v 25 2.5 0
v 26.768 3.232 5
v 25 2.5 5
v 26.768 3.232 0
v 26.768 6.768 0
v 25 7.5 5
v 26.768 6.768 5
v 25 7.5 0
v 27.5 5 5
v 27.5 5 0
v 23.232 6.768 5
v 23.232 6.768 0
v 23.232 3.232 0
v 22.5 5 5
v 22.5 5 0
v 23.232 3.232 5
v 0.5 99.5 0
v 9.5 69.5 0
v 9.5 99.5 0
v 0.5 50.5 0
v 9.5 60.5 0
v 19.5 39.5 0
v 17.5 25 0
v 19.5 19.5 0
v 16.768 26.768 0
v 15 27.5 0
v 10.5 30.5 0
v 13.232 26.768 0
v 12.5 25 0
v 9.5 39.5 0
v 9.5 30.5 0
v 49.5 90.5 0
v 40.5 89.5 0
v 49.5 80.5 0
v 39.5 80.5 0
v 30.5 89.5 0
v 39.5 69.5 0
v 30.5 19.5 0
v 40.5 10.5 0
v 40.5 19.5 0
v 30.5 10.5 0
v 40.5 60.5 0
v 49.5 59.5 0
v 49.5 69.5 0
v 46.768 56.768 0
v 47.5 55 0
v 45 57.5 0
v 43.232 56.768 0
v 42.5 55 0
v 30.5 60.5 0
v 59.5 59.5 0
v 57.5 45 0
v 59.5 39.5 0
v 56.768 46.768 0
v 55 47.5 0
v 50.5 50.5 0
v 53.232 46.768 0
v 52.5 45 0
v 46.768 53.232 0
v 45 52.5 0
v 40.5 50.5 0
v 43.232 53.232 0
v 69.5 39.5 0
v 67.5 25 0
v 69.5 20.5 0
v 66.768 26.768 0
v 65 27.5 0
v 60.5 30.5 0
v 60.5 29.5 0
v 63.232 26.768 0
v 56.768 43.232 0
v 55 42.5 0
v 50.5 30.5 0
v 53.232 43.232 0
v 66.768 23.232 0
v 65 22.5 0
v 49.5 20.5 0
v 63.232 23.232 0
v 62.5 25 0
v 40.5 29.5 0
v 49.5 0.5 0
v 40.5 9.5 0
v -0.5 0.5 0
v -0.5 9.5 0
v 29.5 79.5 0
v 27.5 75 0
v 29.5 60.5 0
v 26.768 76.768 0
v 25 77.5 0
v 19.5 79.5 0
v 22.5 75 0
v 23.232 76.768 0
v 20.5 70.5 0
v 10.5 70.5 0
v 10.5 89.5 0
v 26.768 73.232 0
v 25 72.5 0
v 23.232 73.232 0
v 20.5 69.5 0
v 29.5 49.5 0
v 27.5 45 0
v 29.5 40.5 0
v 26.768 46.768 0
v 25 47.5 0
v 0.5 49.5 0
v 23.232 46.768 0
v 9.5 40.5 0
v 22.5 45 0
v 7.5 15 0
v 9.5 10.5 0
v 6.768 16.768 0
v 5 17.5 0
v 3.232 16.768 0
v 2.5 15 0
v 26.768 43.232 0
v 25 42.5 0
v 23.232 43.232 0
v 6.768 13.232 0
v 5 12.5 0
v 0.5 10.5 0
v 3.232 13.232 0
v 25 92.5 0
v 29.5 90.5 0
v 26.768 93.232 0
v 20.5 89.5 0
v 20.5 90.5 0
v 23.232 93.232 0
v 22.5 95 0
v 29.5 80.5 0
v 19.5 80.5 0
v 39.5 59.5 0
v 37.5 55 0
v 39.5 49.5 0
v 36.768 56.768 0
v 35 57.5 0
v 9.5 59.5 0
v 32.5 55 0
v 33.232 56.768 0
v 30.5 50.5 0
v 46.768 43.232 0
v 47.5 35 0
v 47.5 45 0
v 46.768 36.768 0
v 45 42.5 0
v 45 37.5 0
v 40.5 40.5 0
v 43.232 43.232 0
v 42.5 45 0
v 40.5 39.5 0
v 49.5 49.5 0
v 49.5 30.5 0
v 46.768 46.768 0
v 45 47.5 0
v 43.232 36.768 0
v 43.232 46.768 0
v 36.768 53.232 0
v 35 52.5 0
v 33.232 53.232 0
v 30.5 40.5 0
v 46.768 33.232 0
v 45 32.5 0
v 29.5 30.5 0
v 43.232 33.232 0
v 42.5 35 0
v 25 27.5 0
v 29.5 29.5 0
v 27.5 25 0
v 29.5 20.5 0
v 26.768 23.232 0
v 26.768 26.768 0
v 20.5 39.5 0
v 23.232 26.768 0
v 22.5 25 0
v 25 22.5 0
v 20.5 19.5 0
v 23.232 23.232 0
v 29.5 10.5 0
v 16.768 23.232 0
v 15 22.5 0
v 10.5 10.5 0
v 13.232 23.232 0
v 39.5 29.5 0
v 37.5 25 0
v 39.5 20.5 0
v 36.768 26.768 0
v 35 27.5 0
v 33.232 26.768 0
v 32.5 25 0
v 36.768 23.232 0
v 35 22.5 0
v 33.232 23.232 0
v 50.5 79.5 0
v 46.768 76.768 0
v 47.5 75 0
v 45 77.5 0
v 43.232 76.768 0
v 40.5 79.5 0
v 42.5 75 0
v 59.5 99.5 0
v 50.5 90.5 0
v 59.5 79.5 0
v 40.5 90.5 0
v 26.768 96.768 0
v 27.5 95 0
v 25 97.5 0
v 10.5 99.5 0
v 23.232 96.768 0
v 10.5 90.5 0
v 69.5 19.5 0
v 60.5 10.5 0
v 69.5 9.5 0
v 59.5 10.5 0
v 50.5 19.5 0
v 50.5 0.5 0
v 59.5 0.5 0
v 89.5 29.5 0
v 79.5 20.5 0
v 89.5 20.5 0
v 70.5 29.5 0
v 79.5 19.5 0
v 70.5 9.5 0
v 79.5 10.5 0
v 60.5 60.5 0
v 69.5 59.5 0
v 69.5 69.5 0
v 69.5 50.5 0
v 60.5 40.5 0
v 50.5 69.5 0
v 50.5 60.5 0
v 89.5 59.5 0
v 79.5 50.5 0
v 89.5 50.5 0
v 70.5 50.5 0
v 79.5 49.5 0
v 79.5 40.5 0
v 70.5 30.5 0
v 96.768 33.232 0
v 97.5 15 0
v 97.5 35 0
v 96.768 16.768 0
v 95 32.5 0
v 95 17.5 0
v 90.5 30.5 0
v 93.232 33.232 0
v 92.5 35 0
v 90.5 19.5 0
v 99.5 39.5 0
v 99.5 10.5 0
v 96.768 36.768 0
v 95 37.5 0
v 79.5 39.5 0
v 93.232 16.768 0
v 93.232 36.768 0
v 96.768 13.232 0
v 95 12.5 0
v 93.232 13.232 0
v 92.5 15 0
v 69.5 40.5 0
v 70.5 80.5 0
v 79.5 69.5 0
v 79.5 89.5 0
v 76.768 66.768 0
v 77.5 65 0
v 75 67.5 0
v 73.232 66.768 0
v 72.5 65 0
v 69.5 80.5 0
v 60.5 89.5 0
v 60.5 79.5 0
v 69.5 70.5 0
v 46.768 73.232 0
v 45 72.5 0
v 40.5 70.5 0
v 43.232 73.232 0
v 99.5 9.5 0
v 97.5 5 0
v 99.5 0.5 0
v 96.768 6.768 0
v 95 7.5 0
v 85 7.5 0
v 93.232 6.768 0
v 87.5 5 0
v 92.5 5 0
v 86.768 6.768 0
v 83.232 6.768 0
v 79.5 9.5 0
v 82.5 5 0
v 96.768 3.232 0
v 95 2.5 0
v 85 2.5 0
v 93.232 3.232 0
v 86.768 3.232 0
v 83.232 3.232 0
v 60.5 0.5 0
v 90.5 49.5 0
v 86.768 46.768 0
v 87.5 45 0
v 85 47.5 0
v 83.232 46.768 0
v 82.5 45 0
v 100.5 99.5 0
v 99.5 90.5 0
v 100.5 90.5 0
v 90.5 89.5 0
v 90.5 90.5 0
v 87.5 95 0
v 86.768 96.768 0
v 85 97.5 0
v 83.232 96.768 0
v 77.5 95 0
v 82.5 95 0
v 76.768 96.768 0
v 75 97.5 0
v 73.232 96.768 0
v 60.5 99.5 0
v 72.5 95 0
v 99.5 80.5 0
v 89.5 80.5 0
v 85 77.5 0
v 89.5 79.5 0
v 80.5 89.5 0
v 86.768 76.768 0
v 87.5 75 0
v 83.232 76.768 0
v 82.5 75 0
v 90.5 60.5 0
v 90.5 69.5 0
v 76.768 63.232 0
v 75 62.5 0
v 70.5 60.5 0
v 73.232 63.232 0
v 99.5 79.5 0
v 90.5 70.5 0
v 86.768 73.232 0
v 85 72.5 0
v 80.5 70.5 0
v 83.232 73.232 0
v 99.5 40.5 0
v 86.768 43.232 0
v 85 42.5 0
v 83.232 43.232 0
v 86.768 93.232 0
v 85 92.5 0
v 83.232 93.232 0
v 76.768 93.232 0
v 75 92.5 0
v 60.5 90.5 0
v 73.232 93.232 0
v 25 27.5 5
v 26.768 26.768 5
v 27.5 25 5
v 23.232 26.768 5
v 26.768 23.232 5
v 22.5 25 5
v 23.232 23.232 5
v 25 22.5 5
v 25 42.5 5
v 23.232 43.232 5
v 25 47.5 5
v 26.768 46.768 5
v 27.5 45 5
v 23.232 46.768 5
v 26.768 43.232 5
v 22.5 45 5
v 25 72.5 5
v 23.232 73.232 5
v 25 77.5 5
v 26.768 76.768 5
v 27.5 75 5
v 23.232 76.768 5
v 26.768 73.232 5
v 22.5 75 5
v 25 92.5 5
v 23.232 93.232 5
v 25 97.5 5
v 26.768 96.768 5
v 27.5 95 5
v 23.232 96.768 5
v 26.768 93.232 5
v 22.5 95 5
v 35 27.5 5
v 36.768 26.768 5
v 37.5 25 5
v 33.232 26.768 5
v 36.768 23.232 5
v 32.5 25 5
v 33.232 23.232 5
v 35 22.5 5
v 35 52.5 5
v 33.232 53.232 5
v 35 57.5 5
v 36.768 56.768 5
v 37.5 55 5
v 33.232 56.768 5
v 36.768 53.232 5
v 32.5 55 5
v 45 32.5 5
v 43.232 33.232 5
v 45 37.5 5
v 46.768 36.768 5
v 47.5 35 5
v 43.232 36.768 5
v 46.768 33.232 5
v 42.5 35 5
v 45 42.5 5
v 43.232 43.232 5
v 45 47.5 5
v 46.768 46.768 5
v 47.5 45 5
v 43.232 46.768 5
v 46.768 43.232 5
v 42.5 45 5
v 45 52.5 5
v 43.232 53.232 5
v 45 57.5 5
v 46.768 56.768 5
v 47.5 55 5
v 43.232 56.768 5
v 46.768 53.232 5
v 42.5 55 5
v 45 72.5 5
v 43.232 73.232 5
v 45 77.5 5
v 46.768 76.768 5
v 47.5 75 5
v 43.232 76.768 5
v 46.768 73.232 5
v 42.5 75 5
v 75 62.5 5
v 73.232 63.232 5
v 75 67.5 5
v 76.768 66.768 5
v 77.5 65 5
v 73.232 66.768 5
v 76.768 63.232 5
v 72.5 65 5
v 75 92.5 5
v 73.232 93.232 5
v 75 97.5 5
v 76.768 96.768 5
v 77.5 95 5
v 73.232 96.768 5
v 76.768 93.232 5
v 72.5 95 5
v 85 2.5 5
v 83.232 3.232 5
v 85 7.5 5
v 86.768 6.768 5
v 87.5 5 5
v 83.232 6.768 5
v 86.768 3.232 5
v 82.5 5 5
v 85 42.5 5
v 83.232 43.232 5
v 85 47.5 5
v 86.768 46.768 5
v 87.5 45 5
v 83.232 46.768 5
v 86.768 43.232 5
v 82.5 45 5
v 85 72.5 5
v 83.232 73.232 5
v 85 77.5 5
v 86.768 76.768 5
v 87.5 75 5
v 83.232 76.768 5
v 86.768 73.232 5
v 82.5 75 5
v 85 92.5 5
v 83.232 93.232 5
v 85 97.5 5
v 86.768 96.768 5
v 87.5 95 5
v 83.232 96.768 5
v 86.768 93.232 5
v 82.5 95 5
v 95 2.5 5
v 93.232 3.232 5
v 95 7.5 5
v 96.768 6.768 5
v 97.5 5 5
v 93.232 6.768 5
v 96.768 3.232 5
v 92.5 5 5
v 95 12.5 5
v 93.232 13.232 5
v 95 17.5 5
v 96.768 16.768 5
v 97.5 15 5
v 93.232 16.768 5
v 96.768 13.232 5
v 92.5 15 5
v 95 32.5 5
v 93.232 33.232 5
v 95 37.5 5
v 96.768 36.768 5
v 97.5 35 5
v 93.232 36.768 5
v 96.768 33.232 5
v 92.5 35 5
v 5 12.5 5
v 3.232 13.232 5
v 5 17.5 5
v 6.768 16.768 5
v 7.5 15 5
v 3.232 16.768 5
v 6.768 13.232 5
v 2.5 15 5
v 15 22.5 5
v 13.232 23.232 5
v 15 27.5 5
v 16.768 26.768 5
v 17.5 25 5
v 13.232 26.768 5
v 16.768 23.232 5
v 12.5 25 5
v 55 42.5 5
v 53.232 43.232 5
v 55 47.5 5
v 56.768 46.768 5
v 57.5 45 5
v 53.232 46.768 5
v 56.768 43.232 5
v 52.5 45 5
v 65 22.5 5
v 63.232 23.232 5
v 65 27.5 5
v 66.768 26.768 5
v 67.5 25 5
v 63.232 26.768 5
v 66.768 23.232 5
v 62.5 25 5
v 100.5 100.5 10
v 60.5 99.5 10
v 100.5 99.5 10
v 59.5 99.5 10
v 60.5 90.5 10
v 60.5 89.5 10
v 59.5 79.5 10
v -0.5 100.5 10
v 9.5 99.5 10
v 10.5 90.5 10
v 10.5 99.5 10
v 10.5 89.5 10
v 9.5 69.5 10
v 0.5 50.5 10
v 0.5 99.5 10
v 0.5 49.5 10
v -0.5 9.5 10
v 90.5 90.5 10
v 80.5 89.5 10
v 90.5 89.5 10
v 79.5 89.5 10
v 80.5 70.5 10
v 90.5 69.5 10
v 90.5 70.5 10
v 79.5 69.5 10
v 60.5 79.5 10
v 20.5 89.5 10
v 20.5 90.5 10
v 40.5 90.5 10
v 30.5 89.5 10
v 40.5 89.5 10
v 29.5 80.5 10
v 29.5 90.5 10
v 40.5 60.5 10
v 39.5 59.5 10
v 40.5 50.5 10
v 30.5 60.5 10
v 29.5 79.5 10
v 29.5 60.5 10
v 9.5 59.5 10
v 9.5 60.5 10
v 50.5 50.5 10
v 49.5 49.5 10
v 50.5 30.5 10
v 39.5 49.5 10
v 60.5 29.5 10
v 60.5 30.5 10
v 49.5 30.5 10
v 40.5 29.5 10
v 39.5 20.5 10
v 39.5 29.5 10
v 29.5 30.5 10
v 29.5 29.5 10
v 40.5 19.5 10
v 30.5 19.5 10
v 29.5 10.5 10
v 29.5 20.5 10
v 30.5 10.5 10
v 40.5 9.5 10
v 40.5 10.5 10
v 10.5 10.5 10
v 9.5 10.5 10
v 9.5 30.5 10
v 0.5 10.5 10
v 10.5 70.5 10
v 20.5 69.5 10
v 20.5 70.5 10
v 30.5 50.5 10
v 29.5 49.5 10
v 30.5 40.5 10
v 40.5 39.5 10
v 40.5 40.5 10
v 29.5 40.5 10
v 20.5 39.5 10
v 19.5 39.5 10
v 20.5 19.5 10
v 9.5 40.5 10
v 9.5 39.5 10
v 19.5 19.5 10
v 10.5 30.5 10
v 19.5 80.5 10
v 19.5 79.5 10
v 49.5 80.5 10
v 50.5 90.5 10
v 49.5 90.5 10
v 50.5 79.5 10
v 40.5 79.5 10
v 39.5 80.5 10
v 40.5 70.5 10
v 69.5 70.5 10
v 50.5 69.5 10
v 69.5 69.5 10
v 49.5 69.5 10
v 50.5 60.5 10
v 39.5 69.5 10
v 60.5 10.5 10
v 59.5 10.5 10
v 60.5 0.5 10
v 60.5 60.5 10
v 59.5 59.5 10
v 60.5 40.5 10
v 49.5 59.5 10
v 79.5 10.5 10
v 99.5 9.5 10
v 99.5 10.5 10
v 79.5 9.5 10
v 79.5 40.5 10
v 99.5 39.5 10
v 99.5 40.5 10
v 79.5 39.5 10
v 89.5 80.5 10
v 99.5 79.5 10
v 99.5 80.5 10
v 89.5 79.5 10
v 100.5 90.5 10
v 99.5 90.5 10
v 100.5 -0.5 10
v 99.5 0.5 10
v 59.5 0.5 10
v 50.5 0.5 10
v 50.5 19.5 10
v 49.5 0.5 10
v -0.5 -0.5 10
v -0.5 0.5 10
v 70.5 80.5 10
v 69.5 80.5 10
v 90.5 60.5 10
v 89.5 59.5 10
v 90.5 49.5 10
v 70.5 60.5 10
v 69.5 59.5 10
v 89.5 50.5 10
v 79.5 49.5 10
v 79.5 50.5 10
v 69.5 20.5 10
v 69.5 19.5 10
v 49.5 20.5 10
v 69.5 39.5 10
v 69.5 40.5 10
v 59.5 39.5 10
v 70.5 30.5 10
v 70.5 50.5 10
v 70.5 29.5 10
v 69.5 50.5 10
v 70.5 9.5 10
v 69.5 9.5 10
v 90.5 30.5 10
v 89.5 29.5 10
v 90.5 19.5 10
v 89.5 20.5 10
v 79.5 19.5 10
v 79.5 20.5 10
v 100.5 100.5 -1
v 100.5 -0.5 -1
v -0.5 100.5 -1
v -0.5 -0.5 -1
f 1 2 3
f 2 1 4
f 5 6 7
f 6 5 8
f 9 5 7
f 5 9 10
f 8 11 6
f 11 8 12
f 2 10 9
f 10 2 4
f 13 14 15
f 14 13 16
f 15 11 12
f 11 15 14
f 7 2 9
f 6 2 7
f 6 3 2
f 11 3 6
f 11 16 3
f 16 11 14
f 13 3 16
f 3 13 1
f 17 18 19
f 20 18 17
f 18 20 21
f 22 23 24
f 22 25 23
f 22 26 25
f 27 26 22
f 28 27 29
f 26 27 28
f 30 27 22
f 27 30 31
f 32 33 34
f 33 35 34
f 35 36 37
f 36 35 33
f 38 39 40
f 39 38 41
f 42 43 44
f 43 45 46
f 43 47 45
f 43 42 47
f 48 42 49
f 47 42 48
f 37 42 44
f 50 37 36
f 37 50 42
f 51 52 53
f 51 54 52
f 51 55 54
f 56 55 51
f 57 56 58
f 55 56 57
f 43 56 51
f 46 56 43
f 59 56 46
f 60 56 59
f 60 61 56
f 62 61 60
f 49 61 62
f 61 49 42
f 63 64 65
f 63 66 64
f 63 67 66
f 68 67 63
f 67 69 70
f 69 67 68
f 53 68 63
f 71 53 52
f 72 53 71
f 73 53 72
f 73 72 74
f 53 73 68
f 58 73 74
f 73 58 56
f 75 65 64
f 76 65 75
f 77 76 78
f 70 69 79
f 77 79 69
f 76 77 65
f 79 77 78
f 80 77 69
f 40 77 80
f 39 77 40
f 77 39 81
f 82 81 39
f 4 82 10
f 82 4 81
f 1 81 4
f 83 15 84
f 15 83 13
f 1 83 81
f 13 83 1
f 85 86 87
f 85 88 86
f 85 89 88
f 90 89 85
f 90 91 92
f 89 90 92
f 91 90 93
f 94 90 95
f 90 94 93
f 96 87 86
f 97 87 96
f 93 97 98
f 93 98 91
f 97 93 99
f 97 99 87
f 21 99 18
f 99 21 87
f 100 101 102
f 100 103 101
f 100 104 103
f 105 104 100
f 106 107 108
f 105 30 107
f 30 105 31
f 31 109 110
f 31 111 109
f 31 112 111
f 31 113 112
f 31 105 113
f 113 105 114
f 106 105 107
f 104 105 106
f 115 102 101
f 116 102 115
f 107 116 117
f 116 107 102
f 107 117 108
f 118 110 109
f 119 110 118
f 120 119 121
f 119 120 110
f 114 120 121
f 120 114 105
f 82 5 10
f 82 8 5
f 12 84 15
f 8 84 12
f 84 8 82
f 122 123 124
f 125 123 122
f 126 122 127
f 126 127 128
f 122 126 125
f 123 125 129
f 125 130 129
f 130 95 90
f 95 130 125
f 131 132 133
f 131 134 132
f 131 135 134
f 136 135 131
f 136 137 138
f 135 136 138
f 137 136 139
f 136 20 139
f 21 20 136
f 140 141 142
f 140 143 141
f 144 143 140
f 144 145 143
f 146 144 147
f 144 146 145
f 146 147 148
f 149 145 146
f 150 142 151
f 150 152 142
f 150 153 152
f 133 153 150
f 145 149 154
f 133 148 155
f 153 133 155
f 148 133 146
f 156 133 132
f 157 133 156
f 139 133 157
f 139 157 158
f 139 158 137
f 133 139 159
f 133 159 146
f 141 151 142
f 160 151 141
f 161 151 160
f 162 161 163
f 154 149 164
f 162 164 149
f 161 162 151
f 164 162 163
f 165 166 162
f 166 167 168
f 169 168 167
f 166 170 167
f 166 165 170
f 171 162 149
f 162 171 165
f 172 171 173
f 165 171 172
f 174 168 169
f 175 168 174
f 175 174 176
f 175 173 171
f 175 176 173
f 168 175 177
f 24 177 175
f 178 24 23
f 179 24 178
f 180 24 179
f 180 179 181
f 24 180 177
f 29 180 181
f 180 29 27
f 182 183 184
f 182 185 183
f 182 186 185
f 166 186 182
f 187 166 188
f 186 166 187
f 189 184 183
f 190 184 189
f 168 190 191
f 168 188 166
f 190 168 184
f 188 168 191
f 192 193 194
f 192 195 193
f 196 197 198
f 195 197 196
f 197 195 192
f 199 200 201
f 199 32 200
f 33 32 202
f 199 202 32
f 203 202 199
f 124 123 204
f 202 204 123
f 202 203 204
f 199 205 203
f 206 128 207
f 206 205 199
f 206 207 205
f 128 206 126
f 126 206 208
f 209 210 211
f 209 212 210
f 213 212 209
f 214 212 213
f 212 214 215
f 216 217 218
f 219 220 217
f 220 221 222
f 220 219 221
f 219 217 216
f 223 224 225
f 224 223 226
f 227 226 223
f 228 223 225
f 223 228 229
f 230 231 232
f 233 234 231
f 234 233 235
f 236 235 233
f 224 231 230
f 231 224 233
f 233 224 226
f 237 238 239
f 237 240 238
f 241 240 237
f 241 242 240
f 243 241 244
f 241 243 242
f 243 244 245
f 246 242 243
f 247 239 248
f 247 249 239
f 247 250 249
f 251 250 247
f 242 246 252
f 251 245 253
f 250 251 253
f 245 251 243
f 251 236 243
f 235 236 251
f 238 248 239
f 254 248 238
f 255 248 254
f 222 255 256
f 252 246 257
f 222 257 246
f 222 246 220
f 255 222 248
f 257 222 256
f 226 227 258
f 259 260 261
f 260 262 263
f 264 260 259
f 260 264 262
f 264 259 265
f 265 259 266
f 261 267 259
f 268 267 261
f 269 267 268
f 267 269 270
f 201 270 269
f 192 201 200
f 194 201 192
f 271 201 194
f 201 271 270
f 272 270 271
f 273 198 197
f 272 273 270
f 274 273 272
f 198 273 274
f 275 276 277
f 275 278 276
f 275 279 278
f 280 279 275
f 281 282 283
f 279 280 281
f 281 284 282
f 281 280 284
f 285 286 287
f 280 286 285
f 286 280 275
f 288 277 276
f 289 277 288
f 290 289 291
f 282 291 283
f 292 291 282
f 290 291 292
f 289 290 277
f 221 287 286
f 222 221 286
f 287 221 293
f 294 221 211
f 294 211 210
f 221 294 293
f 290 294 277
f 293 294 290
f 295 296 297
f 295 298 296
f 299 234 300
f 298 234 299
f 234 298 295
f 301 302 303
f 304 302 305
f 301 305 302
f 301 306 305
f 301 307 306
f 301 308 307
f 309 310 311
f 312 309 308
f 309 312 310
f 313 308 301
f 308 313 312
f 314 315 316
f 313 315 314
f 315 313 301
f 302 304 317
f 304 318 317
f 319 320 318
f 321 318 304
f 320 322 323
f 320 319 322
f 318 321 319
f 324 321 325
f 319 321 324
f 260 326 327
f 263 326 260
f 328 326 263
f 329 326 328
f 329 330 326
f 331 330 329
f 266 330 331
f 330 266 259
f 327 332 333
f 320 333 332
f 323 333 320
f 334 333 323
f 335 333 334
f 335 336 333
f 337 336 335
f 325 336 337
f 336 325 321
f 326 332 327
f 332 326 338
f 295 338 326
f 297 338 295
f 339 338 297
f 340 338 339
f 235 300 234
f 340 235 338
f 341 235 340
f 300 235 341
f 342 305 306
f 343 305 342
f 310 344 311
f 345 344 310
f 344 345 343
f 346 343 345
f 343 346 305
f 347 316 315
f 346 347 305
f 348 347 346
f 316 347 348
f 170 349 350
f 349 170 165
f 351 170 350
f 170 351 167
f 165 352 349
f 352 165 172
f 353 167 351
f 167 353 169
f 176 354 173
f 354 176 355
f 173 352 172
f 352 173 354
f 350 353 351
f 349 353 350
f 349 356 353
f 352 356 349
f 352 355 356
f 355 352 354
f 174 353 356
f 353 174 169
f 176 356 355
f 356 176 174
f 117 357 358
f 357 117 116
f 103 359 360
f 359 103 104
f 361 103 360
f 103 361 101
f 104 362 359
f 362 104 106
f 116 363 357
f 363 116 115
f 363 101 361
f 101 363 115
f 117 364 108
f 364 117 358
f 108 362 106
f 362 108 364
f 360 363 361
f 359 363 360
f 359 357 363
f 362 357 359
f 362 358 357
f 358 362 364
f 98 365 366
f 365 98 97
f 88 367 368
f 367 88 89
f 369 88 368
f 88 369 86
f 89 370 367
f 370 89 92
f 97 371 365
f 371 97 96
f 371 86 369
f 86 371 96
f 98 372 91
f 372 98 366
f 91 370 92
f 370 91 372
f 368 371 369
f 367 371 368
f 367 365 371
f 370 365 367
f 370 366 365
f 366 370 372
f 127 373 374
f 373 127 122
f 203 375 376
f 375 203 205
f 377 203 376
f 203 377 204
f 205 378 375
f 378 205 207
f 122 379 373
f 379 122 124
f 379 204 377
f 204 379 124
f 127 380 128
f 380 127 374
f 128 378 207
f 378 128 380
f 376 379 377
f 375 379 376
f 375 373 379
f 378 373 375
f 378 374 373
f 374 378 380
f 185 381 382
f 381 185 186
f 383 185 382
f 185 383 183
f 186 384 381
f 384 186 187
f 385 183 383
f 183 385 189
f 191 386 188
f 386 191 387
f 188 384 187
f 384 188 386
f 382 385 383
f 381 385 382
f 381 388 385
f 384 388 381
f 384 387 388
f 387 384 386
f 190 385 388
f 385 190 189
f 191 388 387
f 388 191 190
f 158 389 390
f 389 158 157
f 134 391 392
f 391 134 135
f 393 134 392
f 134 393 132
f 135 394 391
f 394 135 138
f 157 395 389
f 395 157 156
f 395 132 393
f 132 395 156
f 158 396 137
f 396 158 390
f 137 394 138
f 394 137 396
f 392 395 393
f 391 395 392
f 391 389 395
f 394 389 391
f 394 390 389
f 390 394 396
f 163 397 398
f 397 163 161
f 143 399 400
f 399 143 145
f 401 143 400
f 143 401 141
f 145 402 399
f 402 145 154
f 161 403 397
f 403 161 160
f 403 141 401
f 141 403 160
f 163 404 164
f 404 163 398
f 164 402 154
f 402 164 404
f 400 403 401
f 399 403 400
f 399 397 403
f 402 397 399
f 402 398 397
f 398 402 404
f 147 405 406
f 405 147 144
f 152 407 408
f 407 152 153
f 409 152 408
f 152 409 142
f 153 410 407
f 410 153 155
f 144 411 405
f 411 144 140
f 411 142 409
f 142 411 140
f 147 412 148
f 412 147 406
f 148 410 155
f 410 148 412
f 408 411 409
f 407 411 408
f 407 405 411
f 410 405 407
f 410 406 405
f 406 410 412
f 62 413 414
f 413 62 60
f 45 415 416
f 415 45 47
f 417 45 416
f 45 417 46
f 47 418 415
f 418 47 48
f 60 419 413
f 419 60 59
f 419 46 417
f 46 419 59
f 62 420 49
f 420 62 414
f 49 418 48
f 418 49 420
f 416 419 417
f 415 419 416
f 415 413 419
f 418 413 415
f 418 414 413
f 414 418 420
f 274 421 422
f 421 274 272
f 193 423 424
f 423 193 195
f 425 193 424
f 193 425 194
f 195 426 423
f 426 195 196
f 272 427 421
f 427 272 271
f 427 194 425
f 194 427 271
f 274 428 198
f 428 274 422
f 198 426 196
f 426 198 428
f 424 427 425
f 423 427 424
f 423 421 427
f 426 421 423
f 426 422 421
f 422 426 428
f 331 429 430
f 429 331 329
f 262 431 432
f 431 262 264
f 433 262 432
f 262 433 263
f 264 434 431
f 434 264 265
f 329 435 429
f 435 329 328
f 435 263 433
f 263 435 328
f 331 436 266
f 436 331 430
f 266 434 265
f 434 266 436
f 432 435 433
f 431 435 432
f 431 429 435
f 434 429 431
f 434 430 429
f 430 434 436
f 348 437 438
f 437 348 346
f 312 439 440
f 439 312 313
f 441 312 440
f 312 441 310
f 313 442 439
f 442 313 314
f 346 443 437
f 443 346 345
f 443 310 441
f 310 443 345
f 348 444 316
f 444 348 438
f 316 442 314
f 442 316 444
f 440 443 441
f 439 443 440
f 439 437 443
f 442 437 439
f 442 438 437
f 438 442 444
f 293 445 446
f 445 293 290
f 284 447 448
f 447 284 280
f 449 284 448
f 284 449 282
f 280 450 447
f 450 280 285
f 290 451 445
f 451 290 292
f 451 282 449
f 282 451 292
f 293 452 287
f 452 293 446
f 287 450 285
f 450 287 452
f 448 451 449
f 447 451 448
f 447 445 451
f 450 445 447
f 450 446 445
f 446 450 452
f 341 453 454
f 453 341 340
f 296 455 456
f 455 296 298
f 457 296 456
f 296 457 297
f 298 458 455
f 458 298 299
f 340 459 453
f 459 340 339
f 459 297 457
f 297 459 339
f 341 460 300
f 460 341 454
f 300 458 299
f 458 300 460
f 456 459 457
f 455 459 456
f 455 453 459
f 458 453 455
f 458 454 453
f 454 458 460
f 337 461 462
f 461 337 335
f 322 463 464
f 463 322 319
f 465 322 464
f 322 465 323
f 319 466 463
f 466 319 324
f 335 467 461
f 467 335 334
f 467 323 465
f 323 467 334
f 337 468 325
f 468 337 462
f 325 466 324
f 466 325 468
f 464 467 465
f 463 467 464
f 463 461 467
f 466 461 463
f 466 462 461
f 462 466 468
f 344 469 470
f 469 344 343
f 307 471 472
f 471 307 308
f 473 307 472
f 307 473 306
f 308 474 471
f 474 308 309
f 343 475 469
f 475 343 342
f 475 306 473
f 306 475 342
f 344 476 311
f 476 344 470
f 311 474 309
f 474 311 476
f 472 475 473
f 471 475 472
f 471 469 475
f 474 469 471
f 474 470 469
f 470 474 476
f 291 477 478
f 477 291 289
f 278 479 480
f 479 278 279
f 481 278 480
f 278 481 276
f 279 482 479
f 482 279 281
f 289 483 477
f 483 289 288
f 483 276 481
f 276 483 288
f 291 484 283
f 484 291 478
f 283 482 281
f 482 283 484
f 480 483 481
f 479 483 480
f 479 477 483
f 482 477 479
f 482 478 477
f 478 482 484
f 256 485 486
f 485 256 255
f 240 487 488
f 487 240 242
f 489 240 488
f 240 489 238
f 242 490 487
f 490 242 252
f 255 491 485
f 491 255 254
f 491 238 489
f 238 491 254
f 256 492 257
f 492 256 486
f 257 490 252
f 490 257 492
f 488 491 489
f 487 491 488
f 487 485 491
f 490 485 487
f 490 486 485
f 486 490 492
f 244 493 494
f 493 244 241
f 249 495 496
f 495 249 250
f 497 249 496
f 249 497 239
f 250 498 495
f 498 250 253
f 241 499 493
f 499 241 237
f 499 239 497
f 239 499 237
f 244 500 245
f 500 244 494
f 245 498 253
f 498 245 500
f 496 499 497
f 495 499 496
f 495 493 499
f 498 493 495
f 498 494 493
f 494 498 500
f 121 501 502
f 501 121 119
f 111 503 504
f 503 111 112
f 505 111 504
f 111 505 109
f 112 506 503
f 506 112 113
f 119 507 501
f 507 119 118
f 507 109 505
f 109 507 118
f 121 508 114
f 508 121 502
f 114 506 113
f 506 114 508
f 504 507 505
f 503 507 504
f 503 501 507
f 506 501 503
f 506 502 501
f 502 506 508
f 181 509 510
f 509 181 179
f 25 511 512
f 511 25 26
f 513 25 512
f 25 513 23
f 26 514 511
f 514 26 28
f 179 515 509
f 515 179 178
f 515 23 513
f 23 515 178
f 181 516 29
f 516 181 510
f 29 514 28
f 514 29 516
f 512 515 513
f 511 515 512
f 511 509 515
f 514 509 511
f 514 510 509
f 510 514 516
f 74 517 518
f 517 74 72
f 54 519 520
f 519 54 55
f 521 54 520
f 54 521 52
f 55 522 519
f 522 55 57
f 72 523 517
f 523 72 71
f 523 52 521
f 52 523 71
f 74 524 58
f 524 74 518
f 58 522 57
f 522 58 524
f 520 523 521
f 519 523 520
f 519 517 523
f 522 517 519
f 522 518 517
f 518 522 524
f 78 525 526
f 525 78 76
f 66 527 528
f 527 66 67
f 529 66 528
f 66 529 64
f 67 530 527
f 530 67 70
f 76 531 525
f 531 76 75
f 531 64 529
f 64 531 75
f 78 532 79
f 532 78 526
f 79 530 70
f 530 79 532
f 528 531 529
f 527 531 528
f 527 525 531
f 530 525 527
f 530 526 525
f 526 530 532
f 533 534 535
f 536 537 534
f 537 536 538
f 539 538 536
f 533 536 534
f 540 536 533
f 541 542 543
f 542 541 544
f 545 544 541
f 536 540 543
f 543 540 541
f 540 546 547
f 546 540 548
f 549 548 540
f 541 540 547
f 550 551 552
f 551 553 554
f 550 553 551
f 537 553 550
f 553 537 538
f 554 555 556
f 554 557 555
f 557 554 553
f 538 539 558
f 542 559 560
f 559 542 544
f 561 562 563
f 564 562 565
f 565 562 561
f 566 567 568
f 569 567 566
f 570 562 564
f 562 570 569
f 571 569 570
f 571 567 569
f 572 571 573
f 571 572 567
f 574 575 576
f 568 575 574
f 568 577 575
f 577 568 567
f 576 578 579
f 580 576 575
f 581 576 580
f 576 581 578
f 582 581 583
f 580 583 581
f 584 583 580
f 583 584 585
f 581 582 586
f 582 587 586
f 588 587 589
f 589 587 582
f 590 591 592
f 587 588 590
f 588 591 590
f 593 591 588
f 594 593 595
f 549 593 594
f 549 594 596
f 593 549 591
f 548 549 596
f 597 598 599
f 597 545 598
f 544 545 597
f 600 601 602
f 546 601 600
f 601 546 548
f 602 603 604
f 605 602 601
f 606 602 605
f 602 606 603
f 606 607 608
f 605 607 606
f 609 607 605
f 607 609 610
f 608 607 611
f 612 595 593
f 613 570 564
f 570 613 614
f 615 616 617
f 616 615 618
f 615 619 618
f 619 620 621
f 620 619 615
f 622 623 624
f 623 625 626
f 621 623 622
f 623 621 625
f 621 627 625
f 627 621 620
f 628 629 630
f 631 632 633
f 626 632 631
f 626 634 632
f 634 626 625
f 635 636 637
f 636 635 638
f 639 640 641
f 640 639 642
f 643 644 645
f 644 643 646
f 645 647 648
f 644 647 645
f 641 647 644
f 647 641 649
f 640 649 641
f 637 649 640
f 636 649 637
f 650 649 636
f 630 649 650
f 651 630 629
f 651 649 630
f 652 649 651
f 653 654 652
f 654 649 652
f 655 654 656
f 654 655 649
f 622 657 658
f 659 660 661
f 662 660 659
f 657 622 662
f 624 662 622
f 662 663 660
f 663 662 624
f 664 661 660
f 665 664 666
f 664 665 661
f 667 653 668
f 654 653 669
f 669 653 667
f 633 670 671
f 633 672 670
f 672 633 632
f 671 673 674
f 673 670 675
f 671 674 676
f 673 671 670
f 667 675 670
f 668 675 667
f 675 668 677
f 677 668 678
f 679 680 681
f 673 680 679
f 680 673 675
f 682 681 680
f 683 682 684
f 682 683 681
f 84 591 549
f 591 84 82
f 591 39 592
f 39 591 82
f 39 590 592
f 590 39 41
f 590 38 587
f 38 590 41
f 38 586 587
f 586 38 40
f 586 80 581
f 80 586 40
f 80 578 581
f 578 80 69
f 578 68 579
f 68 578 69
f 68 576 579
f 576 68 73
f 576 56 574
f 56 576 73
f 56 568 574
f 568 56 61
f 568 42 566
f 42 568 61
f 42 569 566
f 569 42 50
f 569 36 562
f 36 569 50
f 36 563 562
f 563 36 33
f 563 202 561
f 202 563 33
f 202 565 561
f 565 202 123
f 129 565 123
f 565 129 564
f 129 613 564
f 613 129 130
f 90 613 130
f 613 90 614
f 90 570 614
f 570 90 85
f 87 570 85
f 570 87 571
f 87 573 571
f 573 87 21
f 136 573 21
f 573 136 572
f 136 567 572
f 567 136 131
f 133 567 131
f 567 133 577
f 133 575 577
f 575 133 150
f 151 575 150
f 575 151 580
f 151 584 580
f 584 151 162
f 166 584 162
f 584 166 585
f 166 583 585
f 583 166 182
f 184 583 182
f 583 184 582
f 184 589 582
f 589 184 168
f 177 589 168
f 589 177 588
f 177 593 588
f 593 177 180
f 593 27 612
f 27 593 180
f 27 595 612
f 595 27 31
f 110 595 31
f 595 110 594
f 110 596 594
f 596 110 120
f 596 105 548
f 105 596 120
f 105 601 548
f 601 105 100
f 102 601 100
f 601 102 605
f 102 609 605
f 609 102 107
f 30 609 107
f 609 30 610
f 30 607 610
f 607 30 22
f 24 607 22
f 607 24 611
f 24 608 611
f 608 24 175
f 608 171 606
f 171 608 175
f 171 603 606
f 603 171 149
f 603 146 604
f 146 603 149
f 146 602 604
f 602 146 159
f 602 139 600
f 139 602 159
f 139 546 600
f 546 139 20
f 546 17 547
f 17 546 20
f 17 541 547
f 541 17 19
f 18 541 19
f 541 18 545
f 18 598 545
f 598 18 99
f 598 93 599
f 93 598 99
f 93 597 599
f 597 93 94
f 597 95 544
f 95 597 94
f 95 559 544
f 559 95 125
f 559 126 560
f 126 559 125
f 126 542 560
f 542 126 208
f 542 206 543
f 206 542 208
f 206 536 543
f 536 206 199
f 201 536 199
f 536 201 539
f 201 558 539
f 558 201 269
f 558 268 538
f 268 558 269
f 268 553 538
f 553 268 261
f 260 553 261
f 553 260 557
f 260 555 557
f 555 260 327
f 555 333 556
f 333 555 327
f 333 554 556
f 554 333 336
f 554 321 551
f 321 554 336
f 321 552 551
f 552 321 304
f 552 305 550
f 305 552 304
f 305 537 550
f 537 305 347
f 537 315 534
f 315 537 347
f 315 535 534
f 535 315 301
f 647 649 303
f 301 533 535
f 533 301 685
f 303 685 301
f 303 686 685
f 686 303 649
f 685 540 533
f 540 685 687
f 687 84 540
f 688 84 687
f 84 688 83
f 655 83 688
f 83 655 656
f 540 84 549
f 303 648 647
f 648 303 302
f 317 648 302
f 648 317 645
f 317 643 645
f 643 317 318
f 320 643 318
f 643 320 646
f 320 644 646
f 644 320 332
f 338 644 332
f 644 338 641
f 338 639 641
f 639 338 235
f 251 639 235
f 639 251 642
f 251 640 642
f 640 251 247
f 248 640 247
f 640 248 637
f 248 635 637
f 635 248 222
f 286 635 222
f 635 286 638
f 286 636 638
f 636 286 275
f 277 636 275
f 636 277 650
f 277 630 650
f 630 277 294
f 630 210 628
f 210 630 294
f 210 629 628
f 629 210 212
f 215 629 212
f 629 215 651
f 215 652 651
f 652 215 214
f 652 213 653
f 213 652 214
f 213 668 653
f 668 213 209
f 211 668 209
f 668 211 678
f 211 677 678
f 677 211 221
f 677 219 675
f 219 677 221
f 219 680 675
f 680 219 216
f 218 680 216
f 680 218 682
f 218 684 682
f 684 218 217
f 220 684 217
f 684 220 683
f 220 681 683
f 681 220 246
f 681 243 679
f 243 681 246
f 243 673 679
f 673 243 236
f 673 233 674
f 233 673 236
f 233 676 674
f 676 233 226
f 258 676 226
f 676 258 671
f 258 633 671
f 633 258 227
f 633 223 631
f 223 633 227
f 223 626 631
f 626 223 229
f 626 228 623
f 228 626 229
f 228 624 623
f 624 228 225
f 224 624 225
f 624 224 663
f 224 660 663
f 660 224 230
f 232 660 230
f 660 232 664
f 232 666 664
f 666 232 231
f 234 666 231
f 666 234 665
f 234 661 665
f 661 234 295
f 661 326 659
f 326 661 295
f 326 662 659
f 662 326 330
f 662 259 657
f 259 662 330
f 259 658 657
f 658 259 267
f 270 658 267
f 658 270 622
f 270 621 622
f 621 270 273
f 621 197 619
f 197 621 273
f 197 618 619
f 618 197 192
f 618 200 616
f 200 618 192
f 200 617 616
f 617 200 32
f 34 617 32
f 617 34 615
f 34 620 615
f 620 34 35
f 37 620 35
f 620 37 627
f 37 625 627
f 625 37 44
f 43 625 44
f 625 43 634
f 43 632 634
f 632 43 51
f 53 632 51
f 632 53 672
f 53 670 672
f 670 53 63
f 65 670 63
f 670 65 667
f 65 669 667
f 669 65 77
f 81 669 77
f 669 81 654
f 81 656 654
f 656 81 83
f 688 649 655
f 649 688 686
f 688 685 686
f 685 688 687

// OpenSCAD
rows = 10; 
columns = 10; 
wall_thickness = 1;
wall_height = 10;
block_width = 10;
pillar_chance = 0.3;
bottom = "YES";


/*
 * constants, for clearness
 *
 */
 
// random directions, for picking up a direction to visit the next block
function PERMUTATION_OF_FOUR() = [
    [1, 2, 3, 4],
    [1, 2, 4, 3],
    [1, 3, 2, 4],
    [1, 3, 4, 2],
    [1, 4, 2, 3],
    [1, 4, 3, 2],
    [2, 1, 3, 4],
    [2, 1, 4, 3],
    [2, 3, 1, 4],
    [2, 3, 4, 1],
    [2, 4, 1, 3],
    [2, 4, 3, 1],
    [3, 1, 2, 4],
    [3, 1, 4, 2],
    [3, 2, 1, 4],
    [3, 2, 4, 1],
    [3, 4, 1, 2],
    [3, 4, 2, 1],
    [4, 1, 2, 3],
    [4, 1, 3, 2],
    [4, 2, 1, 3],
    [4, 2, 3, 1],
    [4, 3, 1, 2],
    [4, 3, 2, 1]
];

function NO_WALL() = 0;
function UP_WALL() = 1;
function RIGHT_WALL() = 2;
function UP_RIGHT_WALL() = 3;

function NOT_VISITED() = 0;
function VISITED() = 1;

/* 
 * modules for creating a maze
 *
 */

// give a [x, y] point and length. draw a line in the x direction
module x_line(point, length, thickness = 1) {
    offset = thickness / 2;
    translate([point[0] - offset, point[1] - offset, 0]) 
        square([length + thickness, thickness]);
}

// give a [x, y] point and length. draw a line in the y direction
module y_line(point, length, thickness = 1) {
    offset = thickness / 2;
    translate([point[0] - offset, point[1] - offset, 0])  
        square([thickness, length + thickness]);
}

// create the outer wall of maze
module maze_outer_wall(rows, columns, block_width = 5, wall_thickness = 1) {
    x_line([0, rows * block_width], columns * block_width, wall_thickness);
    y_line([0, block_width], (rows - 1) * block_width, wall_thickness);
}

// create the inner wall of maze
module maze_inner_wall(maze, block_width = 5, wall_thickness = 1) {
    for(i = [0:len(maze) - 1]) {
        cord = maze[i];
        x = (cord[0] - 1) * block_width;
        y = (cord[1] - 1) * block_width;
        v = cord[3];
        
        if(v == 1 || v == 3) {
            x_line([x, y], block_width, wall_thickness);
        }
        if(v == 2 || v == 3) {
            y_line([x + block_width, y], block_width, wall_thickness);
        }
    }  
}

// create a maze
module maze(rows, columns, maze_vector, block_width = 5, wall_thickness = 1) {
     maze_outer_wall(rows, columns, block_width, wall_thickness);
     maze_inner_wall(maze_vector, block_width, wall_thickness);
}

//Create a pillar in a certain grid cell.
module pillar(x, y) {
	translate([x * block_width + block_width / 2, y * block_width + block_width / 2, 0]) {
		cylinder(r=block_width / 4, h=wall_height / 2);
	}
}

//Create random pillars in the maze.
module pillars() {
	has_pillar = rands(0, 1, columns * rows);
	for(x = [0 : columns - 1]) {
		for(y = [0 : rows - 1]) {
			if(has_pillar[x * columns + y] > 1 - pillar_chance) {
				pillar(x, y);
			}
		}
	}
}

/* 
 * utilities functions
 *
 */

// comare the equality of [x1, y1] and [x2, y2]
function cord_equals(cord1, cord2) = cord1 == cord2;

// is the point visited?
function not_visited(cord, vs, index = 0) =
    index == len(vs) ? true : 
        (cord_equals([vs[index][0], vs[index][1]], cord) && vs[index][2] == 1 ? false :
            not_visited(cord, vs, index + 1));
            
// pick a direction randomly
function rand_dirs() =
    PERMUTATION_OF_FOUR()[round(rands(0, 24, 1)[0])]; 

// replace v1 in the vector with v2 
function replace(v1, v2, vs) =
    [for(i = [0:len(vs) - 1]) vs[i] == v1 ? v2 : vs[i]];
    
/* 
 * functions for generating a maze vector
 *
 */

// initialize a maze
function init_maze(rows, columns) = 
    [
	    for(c = [1 : columns]) 
	        for(r = [1 : rows]) 
		        [c, r, 0,  UP_RIGHT_WALL()]
	];
    
// find a vector in the maze vector
function find(i, j, maze_vector, index = 0) =
    index == len(maze_vector) ? [] : (
        cord_equals([i, j], [maze_vector[index][0], maze_vector[index][1]]) ? maze_vector[index] : find(i, j, maze_vector, index + 1)
    );

////
// NO_WALL = 0;
// UP_WALL = 1;
// RIGHT_WALL = 2;
// UP_RIGHT_WALL = 3;
function delete_right_wall(original_block) = 
    original_block == NO_WALL() || original_block == RIGHT_WALL() ? NO_WALL() : UP_WALL();

function delete_up_wall(original_block) = 
    (original_block == NO_WALL() || original_block == UP_WALL()) ? NO_WALL() : RIGHT_WALL();
    
function delete_right_wall_of(vs, is_visited, maze_vector) =
    replace(vs, [vs[0], vs[1] , is_visited, delete_right_wall(vs[3])] ,maze_vector);

function delete_up_wall_of(vs, is_visited, maze_vector) =
    replace(vs, [vs[0], vs[1] , is_visited, delete_up_wall(vs[3])] ,maze_vector);

function go_right(i, j, rows, columns, maze_vector) =
    go_maze(i + 1, j, rows, columns, delete_right_wall_of(find(i, j, maze_vector), VISITED(), maze_vector));
    
function go_up(i, j, rows, columns, maze_vector) =
    go_maze(i, j - 1, rows, columns, delete_up_wall_of(find(i, j, maze_vector), VISITED(), maze_vector));
    
function visit(v, maze_vector) =
    replace(v, [v[0], v[1], VISITED(), v[3]], maze_vector);
 
function go_left(i, j, rows, columns, maze_vector) =
    go_maze(i - 1, j, rows, columns, delete_right_wall_of(find(i - 1, j, maze_vector), NOT_VISITED(), maze_vector));
    
function go_down(i, j, rows, columns, maze_vector) =
    go_maze(i, j + 1, rows, columns, delete_up_wall_of(find(i, j + 1, maze_vector), NOT_VISITED(), maze_vector));
    
function go_maze(i, j, rows, columns, maze_vector) =
    look_around(i, j, rand_dirs(), rows, columns, visit(find(i, j, maze_vector), maze_vector));
    
function look_around(i, j, dirs, rows, columns, maze_vector, index = 0) =
    index == 4 ? maze_vector : 
        look_around( 
            i, j, dirs, 
            rows, columns, 
            build_wall(i, j, dirs[index], rows, columns, maze_vector), 
            index + 1
        ); 

function build_wall(i, j, n, rows, columns, maze_vector) = 
    n == 1 && i != columns && not_visited([i + 1, j], maze_vector) ? go_right(i, j, rows, columns, maze_vector) : ( 
        n == 2 && j != 1 && not_visited([i, j - 1], maze_vector) ? go_up(i, j, rows, columns, maze_vector)  : (
            n == 3 && i != 1 && not_visited([i - 1, j], maze_vector) ? go_left(i, j,rows, columns,  maze_vector)  : (
                n == 4 && j != rows && not_visited([i, j + 1], maze_vector) ? go_down(i, j, rows, columns, maze_vector) : maze_vector
            ) 
        )
    );

/*
 * create a maze
 *
 */
maze_vector = go_maze(1, 1, rows, columns, replace([columns, rows, 0, UP_RIGHT_WALL()], [columns, rows, 0, UP_WALL()], init_maze(rows, columns)));
linear_extrude(wall_height) 
    maze(rows, columns, maze_vector, block_width, wall_thickness);
pillars();
	
if(bottom == "YES") {
    translate([-wall_thickness / 2, -wall_thickness / 2, -wall_thickness]) 
	    linear_extrude(wall_thickness) square([block_width * columns + wall_thickness, block_width * rows + wall_thickness]);
}
